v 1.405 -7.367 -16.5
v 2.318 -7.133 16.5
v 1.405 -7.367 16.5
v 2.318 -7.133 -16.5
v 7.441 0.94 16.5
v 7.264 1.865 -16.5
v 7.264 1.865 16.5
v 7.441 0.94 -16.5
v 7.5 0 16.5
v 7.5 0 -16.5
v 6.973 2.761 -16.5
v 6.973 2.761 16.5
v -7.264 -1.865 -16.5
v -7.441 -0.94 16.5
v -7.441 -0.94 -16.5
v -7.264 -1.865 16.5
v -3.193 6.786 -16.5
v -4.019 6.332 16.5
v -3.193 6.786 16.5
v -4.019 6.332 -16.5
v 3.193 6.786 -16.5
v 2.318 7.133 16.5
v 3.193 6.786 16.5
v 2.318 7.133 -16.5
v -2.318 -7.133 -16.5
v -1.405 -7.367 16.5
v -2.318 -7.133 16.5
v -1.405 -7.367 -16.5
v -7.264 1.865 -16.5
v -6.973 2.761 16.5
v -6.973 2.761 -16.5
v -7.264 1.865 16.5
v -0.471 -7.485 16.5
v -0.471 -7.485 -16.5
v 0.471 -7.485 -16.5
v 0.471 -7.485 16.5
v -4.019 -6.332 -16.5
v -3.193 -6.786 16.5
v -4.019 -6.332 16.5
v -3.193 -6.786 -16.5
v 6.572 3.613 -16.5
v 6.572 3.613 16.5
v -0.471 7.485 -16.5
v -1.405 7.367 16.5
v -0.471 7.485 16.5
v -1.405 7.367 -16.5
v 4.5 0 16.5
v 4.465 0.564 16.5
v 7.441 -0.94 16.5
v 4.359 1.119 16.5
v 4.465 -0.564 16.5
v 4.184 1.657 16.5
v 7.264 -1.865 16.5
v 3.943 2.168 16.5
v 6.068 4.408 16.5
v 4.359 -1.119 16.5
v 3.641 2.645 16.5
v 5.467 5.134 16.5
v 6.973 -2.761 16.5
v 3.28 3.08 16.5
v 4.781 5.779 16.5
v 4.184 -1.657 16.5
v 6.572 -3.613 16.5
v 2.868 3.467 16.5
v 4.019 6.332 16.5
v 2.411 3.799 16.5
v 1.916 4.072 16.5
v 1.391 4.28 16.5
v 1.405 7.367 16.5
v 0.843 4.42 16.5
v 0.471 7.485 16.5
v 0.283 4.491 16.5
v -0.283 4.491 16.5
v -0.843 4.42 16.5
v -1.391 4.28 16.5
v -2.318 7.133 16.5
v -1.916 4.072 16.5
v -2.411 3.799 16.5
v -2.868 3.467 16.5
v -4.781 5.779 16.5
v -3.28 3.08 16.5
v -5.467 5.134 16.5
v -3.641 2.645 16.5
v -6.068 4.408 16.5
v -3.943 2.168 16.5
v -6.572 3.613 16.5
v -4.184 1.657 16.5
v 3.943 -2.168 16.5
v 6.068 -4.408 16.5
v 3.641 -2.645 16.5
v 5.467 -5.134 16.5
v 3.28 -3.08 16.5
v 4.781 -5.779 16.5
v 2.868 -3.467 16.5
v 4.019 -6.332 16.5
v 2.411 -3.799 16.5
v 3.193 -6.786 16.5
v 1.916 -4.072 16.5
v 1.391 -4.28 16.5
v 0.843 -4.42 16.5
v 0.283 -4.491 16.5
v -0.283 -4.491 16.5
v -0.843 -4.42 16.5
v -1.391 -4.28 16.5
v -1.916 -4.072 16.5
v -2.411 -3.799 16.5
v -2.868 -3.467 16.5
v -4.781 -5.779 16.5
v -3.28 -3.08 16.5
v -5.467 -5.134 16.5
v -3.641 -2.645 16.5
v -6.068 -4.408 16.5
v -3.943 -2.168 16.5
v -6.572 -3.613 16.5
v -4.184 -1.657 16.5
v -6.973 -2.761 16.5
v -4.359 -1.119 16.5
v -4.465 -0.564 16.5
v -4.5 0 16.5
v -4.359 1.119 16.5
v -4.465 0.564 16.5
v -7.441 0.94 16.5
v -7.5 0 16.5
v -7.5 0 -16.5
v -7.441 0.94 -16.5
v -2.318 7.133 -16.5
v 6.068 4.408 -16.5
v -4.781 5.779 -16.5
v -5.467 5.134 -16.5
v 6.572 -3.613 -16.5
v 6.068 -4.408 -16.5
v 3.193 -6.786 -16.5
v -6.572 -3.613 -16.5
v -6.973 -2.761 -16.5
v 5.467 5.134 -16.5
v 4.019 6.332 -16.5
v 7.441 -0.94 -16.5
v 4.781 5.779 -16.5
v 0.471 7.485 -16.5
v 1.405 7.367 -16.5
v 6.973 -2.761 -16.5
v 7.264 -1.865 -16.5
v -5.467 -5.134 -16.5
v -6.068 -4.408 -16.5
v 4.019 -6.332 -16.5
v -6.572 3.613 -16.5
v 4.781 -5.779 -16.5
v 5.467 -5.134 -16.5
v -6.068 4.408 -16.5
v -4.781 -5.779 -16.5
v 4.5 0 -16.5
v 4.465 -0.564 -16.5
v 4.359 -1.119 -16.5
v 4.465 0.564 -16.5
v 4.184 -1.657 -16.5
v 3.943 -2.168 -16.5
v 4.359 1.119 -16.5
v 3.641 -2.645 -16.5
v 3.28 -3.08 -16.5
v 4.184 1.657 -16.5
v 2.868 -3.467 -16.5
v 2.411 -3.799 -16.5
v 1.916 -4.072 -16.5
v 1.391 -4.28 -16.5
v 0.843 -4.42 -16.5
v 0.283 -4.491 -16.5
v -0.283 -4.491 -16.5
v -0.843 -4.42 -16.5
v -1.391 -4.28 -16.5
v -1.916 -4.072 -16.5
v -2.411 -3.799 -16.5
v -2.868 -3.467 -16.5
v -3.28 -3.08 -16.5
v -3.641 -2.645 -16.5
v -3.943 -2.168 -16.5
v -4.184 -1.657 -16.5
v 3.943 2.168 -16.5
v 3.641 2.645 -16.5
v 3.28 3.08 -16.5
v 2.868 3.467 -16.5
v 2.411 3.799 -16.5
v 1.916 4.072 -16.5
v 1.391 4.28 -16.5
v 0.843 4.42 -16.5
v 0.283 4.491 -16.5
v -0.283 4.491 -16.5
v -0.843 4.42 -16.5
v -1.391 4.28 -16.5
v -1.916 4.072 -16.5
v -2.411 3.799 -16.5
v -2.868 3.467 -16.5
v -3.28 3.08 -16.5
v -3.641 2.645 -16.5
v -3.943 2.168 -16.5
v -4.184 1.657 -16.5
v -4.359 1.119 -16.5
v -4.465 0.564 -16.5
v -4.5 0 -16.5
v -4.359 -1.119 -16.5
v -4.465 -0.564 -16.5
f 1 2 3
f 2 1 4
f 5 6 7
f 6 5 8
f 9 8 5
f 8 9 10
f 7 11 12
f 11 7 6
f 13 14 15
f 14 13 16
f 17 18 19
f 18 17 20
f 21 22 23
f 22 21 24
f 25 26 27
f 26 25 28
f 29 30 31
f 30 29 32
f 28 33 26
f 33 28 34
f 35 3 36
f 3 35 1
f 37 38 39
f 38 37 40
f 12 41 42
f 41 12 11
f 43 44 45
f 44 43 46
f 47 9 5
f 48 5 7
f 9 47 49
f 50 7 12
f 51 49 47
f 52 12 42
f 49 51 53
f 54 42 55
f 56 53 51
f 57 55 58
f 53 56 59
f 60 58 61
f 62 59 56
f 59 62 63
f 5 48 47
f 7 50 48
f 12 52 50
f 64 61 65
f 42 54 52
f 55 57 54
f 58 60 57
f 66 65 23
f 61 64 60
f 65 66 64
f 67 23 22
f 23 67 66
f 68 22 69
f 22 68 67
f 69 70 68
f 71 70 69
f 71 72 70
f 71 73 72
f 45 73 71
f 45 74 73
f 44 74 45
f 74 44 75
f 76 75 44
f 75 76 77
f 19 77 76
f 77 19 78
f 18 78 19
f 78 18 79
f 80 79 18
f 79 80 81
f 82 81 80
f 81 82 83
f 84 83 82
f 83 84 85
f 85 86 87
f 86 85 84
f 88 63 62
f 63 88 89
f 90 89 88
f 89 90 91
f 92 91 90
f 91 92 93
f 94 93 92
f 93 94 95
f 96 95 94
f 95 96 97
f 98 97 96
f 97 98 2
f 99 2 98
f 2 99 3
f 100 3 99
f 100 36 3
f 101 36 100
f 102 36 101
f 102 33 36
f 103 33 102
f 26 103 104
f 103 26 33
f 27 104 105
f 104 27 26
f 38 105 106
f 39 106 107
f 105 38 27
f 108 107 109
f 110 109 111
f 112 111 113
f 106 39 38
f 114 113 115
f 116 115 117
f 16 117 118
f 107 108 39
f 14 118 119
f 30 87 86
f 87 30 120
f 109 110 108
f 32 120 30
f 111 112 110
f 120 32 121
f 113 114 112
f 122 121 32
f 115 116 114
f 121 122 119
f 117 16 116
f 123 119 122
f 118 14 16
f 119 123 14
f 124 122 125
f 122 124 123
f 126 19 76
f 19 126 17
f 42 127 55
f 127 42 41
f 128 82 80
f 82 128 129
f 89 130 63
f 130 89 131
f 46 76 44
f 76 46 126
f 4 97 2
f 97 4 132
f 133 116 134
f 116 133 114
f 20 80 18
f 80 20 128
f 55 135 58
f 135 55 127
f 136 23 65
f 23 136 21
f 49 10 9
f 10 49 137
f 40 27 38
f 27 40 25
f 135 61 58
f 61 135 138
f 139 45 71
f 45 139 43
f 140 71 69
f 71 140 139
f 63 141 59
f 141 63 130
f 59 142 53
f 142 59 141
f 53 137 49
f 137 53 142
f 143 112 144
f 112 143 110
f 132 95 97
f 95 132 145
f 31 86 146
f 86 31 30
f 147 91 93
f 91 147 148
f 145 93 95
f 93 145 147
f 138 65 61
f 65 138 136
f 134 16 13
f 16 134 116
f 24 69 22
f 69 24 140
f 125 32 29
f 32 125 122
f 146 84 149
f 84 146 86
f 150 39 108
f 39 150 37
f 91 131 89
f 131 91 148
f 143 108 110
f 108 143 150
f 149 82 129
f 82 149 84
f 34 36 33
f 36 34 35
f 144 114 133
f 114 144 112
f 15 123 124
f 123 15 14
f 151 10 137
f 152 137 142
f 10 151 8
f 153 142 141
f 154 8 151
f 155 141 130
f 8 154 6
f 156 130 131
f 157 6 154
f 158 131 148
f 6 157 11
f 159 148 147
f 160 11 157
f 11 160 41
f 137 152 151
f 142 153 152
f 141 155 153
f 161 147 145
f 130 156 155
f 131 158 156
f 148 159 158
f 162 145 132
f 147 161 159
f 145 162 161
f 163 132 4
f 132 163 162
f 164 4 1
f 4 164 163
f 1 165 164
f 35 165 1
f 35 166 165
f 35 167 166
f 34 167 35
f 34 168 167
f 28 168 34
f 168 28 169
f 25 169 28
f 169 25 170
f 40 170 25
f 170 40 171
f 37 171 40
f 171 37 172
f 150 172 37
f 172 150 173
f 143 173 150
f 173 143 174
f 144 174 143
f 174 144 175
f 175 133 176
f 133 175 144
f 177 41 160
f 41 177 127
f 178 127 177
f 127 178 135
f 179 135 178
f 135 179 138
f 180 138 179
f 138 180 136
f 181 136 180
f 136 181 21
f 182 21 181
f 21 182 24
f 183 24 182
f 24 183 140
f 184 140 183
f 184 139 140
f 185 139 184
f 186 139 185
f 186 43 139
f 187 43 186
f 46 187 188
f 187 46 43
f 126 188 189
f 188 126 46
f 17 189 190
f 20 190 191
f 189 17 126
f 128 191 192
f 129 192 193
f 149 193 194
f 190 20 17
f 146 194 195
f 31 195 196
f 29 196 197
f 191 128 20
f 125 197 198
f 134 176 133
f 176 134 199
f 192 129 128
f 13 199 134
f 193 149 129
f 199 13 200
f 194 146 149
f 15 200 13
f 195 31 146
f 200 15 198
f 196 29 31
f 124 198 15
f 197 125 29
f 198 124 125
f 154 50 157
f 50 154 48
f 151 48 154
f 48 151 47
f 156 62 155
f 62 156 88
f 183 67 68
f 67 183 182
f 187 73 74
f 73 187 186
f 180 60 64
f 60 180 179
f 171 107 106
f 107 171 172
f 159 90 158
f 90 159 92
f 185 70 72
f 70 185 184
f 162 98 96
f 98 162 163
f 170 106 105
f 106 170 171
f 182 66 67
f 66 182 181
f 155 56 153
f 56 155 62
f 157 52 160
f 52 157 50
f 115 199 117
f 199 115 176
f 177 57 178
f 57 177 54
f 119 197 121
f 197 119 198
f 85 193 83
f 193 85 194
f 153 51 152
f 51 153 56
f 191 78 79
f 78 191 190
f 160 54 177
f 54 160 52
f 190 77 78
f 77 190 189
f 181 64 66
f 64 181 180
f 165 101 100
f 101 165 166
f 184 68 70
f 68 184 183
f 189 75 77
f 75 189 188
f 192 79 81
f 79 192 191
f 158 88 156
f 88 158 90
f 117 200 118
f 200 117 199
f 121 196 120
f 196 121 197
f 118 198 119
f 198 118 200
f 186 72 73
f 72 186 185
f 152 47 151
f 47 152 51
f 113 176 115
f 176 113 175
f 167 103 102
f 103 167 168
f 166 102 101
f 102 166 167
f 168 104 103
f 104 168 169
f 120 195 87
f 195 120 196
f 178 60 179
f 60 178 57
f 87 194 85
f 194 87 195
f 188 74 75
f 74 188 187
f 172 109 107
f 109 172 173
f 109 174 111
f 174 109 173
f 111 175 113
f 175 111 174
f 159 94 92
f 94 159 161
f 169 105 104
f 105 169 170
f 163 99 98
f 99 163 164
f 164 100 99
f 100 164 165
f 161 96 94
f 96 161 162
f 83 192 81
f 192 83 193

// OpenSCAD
$fn = 50;


difference() {
	union() {
		translate(v = [0, 0, -16.5000000000]) {
			cylinder(h = 33, r = 7.5000000000);
		}
	}
	union() {
		translate(v = [0, 0, -100.0000000000]) {
			cylinder(h = 200, r = 4.5000000000);
		}
	}
}
